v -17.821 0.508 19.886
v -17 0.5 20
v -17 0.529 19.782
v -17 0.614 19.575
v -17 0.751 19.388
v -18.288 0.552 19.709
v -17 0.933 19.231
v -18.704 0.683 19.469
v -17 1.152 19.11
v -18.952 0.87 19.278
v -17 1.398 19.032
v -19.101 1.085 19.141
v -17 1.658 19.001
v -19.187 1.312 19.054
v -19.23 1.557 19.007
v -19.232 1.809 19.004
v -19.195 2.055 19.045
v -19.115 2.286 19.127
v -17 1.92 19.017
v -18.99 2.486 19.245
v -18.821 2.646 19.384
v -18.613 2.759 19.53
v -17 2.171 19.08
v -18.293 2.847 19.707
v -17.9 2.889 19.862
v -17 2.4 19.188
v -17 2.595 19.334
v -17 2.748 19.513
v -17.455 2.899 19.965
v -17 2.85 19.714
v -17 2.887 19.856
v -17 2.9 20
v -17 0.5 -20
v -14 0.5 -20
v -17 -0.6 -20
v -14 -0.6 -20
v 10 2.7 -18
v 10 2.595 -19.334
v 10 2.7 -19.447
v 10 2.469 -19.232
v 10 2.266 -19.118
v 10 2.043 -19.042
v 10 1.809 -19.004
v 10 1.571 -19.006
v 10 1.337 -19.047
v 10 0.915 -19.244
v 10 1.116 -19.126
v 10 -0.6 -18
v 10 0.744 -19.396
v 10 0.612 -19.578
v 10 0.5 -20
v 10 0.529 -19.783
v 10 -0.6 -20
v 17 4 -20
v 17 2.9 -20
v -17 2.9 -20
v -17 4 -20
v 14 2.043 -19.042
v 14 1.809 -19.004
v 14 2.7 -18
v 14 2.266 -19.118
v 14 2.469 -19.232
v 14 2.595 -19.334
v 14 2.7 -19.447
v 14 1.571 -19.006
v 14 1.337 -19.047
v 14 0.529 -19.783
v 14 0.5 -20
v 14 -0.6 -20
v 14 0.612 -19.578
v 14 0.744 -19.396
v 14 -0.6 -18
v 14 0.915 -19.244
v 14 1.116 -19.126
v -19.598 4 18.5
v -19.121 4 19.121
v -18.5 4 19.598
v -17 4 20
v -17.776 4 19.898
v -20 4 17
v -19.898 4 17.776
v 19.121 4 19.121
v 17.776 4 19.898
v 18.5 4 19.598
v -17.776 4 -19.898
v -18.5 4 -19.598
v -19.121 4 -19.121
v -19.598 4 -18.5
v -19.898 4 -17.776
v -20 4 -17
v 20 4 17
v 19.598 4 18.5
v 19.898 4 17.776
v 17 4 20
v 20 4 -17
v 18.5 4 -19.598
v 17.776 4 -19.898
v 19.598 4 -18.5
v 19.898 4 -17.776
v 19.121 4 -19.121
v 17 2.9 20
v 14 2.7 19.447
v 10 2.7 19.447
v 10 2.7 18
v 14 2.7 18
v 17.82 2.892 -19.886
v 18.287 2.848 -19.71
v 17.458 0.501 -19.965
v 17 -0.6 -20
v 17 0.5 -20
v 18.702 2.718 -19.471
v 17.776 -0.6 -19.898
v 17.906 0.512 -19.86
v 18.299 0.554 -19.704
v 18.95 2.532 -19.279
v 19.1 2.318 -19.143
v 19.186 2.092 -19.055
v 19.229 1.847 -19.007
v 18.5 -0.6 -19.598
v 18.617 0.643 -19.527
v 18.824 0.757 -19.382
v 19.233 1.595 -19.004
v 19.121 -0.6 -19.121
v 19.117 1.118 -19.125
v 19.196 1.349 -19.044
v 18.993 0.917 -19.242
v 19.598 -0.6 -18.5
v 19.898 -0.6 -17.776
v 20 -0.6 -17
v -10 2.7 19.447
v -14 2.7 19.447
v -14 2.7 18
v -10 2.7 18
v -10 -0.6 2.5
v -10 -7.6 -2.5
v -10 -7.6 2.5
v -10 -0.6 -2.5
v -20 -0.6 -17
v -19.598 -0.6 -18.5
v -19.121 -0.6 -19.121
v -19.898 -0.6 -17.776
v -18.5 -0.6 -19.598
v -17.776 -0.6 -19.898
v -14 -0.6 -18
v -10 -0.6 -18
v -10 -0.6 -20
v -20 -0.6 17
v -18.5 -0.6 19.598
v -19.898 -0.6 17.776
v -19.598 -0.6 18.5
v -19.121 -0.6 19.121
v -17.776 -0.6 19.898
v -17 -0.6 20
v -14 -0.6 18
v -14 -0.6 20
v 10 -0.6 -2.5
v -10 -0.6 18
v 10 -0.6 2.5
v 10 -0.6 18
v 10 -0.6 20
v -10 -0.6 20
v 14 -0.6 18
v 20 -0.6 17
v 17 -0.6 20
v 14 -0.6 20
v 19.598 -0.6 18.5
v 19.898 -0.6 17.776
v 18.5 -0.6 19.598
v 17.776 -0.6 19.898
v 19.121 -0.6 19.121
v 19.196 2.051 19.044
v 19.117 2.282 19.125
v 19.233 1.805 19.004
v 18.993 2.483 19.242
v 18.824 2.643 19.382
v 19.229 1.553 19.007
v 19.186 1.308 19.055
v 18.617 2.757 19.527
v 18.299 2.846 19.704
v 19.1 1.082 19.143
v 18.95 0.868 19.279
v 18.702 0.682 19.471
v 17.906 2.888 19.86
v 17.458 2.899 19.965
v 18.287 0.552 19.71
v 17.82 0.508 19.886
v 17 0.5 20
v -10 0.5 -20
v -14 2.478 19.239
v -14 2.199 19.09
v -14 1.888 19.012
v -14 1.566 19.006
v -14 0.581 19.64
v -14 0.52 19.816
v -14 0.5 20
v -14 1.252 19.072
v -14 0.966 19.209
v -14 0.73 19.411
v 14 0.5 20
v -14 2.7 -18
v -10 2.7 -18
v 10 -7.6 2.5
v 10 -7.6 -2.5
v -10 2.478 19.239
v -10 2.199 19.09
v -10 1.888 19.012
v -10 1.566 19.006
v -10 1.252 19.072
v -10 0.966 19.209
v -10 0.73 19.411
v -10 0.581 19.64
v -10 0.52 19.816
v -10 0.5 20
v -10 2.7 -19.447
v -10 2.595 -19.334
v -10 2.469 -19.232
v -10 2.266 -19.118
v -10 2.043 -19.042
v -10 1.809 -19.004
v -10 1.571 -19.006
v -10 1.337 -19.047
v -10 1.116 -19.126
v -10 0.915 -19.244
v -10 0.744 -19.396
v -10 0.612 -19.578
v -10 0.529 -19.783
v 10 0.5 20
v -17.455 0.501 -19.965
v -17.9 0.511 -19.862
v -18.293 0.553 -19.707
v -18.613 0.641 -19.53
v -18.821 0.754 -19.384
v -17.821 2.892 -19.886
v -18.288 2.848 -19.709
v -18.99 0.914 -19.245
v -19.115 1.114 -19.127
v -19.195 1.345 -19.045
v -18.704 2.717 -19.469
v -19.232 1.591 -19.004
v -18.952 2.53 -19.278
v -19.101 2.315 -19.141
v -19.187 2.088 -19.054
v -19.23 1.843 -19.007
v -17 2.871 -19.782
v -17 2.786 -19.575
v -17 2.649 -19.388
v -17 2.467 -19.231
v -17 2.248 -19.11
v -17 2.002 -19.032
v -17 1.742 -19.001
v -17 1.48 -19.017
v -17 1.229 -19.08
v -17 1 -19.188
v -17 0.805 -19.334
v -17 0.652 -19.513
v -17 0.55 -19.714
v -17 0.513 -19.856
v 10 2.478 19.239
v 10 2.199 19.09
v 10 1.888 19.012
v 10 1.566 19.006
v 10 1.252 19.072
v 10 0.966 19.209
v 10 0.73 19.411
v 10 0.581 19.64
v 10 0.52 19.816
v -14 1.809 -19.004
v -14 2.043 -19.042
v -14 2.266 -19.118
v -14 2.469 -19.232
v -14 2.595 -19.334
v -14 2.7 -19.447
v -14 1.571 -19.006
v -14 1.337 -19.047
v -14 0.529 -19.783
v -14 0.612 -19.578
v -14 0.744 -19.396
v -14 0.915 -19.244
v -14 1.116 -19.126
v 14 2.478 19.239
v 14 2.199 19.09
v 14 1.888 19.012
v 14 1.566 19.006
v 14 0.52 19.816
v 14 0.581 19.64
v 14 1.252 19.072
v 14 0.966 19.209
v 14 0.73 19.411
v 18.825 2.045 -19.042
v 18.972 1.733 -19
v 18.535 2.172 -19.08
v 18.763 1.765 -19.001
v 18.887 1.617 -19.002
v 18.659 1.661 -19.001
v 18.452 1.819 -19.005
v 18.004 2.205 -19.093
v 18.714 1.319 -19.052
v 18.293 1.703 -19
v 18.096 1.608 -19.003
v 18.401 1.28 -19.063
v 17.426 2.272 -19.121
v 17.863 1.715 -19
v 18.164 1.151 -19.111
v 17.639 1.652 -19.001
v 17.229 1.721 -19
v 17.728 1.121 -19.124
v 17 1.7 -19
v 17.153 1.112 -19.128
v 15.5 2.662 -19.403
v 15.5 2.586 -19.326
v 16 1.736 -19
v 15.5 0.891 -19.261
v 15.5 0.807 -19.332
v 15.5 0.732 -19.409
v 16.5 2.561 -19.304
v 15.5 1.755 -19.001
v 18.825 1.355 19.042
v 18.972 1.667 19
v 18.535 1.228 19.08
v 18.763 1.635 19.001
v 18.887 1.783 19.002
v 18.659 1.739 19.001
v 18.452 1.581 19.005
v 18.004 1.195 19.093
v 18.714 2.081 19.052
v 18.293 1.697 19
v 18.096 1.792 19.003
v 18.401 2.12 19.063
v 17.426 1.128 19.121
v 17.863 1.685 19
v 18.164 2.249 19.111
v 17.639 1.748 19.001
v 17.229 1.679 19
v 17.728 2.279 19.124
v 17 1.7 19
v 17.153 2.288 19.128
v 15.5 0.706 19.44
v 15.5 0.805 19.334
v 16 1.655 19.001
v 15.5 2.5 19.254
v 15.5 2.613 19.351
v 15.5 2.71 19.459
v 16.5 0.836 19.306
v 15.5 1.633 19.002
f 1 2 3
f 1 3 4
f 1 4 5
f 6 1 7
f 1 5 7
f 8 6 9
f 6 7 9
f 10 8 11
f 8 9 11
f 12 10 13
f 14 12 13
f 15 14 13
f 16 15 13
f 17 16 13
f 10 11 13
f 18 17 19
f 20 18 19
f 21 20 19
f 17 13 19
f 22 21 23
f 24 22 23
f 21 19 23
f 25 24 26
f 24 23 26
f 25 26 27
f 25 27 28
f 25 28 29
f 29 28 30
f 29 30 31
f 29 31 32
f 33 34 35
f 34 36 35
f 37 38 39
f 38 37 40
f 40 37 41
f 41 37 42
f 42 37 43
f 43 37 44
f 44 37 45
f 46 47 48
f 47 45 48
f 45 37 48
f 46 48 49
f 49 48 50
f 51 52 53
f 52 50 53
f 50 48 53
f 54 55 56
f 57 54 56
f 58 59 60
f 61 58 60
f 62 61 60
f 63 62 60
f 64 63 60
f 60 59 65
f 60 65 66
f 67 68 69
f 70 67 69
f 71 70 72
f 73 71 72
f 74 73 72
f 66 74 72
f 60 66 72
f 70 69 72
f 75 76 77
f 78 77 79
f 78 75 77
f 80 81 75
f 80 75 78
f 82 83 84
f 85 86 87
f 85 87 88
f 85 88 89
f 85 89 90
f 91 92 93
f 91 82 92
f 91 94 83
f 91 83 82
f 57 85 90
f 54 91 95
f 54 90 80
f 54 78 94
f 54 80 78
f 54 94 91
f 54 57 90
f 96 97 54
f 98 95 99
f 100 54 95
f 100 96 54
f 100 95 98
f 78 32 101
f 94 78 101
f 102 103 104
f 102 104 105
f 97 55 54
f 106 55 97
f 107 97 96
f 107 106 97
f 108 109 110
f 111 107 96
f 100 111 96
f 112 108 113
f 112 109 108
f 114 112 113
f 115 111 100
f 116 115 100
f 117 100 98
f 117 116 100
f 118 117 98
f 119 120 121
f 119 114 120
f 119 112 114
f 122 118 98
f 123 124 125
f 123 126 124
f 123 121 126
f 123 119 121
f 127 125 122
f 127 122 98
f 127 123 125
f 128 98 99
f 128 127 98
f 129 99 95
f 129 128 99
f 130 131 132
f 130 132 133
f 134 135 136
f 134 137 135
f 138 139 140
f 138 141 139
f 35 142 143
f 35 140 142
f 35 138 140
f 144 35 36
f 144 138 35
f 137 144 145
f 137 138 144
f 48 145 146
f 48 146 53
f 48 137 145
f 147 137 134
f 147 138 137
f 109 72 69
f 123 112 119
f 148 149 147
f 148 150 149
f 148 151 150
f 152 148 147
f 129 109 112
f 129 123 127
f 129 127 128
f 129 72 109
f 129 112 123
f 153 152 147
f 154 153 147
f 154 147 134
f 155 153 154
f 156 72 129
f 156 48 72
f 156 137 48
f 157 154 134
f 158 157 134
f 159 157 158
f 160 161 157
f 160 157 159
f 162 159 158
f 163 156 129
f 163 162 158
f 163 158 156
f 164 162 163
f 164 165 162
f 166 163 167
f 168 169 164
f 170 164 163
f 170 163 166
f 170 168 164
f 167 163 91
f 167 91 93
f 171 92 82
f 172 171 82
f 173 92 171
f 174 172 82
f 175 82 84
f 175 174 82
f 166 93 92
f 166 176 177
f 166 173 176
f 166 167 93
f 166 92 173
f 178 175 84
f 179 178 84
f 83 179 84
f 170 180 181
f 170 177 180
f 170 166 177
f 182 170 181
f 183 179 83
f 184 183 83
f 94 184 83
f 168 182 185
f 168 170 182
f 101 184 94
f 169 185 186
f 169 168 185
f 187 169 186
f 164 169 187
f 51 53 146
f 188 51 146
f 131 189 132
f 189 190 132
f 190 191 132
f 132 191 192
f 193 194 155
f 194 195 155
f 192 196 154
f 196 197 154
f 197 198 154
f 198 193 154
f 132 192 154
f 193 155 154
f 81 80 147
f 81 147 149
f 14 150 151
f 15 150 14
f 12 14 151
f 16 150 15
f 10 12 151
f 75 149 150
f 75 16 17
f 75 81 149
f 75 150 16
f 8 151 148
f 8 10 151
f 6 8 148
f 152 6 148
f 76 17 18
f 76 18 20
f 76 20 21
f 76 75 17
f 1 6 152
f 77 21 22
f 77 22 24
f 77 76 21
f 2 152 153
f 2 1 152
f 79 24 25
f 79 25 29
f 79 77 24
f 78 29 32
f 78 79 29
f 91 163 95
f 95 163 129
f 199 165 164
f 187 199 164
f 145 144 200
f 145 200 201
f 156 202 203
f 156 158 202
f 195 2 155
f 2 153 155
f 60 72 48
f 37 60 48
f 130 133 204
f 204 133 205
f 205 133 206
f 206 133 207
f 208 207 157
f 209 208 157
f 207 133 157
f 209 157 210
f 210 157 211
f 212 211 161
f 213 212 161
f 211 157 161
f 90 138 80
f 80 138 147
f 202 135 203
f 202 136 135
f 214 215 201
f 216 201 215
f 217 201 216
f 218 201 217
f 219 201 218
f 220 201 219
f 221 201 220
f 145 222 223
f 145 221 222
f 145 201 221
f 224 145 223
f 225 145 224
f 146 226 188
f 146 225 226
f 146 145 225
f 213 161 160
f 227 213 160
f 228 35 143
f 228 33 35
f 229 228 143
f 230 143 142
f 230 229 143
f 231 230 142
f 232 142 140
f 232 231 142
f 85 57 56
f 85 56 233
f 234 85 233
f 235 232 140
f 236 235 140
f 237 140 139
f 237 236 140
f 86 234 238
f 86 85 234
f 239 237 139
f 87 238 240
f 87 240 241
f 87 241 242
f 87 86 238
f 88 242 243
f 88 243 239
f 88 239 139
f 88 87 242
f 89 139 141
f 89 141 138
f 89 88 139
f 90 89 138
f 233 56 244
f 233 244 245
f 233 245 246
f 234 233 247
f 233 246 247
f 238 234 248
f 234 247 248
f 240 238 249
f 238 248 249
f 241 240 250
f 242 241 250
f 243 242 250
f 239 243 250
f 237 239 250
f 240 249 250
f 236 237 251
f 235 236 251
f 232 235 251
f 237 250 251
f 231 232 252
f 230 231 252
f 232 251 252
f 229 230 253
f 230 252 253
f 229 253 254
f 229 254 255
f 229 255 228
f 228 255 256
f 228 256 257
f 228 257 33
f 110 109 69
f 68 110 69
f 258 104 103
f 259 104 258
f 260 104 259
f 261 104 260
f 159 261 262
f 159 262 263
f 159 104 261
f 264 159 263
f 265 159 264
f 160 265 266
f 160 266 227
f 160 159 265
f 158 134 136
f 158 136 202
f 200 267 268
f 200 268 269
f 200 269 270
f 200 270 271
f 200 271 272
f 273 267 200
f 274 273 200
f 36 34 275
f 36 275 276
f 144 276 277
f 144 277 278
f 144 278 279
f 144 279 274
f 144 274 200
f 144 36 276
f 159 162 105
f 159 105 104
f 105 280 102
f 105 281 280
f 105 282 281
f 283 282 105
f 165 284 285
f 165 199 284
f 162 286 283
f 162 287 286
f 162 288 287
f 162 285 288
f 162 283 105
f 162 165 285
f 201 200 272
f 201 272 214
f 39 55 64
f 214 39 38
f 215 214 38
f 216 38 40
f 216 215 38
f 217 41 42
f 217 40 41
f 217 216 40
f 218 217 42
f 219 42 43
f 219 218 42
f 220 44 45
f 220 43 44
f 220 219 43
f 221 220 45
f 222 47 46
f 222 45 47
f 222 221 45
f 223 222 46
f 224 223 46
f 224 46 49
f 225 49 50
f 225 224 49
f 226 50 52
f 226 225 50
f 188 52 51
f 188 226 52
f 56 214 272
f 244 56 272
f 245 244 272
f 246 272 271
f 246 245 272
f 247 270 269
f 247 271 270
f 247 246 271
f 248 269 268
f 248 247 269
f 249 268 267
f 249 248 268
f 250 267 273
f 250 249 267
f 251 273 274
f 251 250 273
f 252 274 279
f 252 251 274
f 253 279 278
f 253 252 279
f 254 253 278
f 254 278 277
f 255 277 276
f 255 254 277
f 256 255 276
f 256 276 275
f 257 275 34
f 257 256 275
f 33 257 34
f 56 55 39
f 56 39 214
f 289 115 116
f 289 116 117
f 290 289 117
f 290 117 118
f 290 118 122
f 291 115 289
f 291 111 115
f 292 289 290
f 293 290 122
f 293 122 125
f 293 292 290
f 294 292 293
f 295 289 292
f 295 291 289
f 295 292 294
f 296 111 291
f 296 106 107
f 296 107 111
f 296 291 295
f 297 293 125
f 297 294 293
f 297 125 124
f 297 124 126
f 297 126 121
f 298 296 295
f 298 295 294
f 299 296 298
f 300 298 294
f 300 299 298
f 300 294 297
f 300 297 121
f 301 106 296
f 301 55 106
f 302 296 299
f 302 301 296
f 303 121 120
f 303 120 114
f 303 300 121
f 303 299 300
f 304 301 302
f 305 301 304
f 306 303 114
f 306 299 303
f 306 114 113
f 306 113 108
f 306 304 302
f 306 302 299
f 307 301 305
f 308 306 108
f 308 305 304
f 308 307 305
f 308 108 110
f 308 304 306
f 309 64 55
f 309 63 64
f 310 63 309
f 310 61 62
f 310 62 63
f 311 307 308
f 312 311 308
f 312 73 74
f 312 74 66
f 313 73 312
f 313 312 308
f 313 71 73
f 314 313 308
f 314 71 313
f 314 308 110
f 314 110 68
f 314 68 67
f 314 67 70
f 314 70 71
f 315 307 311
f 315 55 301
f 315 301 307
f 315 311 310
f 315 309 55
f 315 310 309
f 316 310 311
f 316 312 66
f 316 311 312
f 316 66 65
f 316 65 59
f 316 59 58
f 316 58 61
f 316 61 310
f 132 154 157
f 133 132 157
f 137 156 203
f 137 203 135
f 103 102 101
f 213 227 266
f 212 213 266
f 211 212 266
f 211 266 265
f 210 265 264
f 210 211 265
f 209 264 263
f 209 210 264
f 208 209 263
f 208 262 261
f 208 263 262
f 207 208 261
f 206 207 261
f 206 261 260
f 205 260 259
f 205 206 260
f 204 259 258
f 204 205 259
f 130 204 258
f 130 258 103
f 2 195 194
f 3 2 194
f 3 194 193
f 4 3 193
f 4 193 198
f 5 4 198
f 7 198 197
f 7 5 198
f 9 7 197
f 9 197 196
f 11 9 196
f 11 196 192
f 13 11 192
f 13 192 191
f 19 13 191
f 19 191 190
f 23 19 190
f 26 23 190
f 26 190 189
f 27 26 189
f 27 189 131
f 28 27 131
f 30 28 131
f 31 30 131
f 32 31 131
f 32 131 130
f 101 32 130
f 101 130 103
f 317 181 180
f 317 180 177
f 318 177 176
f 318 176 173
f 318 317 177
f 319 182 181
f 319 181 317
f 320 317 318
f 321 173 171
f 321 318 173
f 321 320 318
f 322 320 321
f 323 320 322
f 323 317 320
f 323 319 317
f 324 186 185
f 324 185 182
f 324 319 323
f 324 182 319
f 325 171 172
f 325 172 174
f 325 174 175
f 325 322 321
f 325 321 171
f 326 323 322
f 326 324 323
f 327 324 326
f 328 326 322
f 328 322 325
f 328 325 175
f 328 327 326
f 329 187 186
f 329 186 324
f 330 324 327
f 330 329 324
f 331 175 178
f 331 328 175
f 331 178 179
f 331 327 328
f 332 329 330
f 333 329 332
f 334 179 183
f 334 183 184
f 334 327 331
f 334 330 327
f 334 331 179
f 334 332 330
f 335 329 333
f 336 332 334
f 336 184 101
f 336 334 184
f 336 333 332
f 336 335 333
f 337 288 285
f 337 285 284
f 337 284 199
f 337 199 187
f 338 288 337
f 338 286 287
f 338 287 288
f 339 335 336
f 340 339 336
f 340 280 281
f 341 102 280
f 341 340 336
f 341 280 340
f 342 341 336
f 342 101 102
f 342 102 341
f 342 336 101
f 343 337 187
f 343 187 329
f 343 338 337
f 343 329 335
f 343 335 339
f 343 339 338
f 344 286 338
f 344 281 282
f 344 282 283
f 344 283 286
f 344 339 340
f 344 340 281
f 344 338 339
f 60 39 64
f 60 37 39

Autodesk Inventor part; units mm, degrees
ref_plane "YZ Plane" through (0, 0, 0) normal (1, 0, 0) x (0, 1, 0)
ref_plane "XZ Plane" through (0, 0, 0) normal (0, 1, 0) x (-1, 0, 0)
sketch "Sketch1" plane through (0, 0, 0) normal (0, 1, 0) x (-1, 0, 0)
  line L0 (20, 20) -> (-20, 20)
  line L1 (-20, 20) -> (-20, -20)
  line L2 (-20, -20) -> (20, -20)
  line L3 (20, -20) -> (20, 20)
  circle A0 centre (12.5, 12.5) radius 4.25
  circle A1 centre (12.5, -12.5) radius 4.25
  circle A2 centre (-12.5, -12.5) radius 4.25
  circle A3 centre (-12.5, 12.5) radius 4.25
  line L4 (20, 0) -> (-20, 0) construction
  line L5 (0, 20) -> (0, -20) construction
  point P0 (0, 0)
  dimension "d0" = 40
  dimension "d1" = 40
  dimension "d2" = 8.5
  dimension "d3" = 25
  dimension "d4" = 25
extrude "Extrusion2" add sketch "Sketch1" along normal blind 2 contours L3 L2 L1 L0 | A0 | A1 | A2 | A3
sketch "Sketch2" plane through (0, 0, 0) normal (0, -1, 0) x (1, 0, 0)
  line L0 (20, 20) -> (20, -20) projected
  line L1 (-20, 20) -> (20, 20) projected
  line L2 (-20, -20) -> (-20, 20) projected
  line L3 (20, -20) -> (-20, -20) projected
  point P0 (0, 0)
extrude "Extrusion3" add sketch "Sketch2" along normal blind 0.6
sketch "Sketch3" plane through (0, 2, 0) normal (0, 1, 0) x (1, 0, 0)
  line L0 (-20, 20) -> (-20, -20) projected
  line L1 (-20, -20) -> (20, -20) projected
  line L2 (20, -20) -> (20, 20) projected
  line L3 (20, 20) -> (-20, 20) projected
  point P0 (0, 0)
extrude "Extrusion4" add sketch "Sketch3" along normal blind 2
fillet "Fillet1" radius 3 4 edges at (-20, 1.7, 20) (-20, 1.7, -20) (20, 1.7, 20) (20, 1.7, -20)
ref_plane "Arbeitsebene1" through (-17, 4, 20) normal (1, 0, 0) x (0, -1, 0)
sketch "Skizze5" plane through (-17, 4, 20) normal (1, 0, 0) x (0, -1, 0)
  line L0 (0, 0) -> (4.6, 0) construction
  line L1 (0, 0) -> (0, 3) construction
  line L2 (0.7, 0) -> (3.5, 0) construction
  line L3 (6.1491, 20) -> (-1.642, 20) construction
  line L4 (0, 40) -> (4.6, 40) construction
  line L5 (0.7, 40) -> (3.5, 40) construction
  line L6 (2.3, 0) -> (2.3, 4.6722) construction
  ellipse E0 centre (2.3, 0) end of major axis (3.5, 0) minor radius 1
  line L7 (1.1, 0) -> (3.5, 0)
  line L8 (0, 40) -> (4.6, 40) construction
  line L9 (0.7, 40) -> (3.5, 40) construction
  ellipse E1 centre (2.3, 40) end of major axis (3.5, 40) minor radius 1
  line L10 (1.1, 40) -> (3.5, 40)
  point P0 (4, 20)
  point P1 (2.3, 1)
  dimension "d22" = 2.3
  dimension "d23" = 1.2
  dimension "d28" = 1
extrude "Extrusion7" cut sketch "Skizze5" along normal blind 37 and the other way blind 5 contours L7 E0 | E1 L10 picked at (2.3176, 0.333) picked at (2.2824, 39.667)
sketch "Skizze6" plane through (0, -0.6, 0) normal (0, -1, 0) x (1, 0, 0)
  line L0 (17, 20) -> (-17, 20) projected
  line L1 (-20, 17) -> (-20, -17) construction
  line L2 (-14, 20) -> (-14, 18)
  line L3 (-14, 20) -> (-10, 20)
  line L4 (0, 16.6905) -> (0, 25.5183)
  line L5 (7.2129, 0) -> (-7.9382, 0)
  line L6 (-17, 20) -> (17, 20)
  line L7 (14, 20) -> (10, 20)
  line L8 (17, -20) -> (-17, -20)
  line L9 (-14, 18) -> (-10, 18)
  line L10 (-10, 18) -> (-10, 20)
  line L11 (-17, -20) -> (17, -20) projected
  line L12 (14, 20) -> (14, 18)
  line L13 (14, 18) -> (10, 18)
  line L14 (10, 18) -> (10, 20)
  line L15 (-14, -20) -> (-14, -18)
  line L16 (-14, -18) -> (-10, -18)
  line L17 (-10, -18) -> (-10, -20)
  line L18 (10, -18) -> (10, -20)
  line L19 (14, -18) -> (10, -18)
  line L20 (14, -20) -> (14, -18)
  point P0 (0, 0)
  point P1 (-12, 20)
  dimension "d34" = 8
  dimension "d35" = 2
  dimension "d41" = 2
  dimension "d42" = 4
extrude "Extrusion8" cut sketch "Skizze6" against normal blind 3.3
sketch "Skizze7" plane through (0, -0.6, 0) normal (0, -1, 0) x (1, 0, 0)
  line L0 (-10, 2.5) -> (10, 2.5)
  line L1 (10, 2.5) -> (10, -2.5)
  line L2 (10, -2.5) -> (-10, -2.5)
  line L3 (-10, -2.5) -> (-10, 2.5)
  line L4 (-10, 2.5) -> (10, -2.5) construction
  line L5 (10, 2.5) -> (-10, -2.5) construction
  point P0 (0, 0)
  dimension "d43" = 5
  dimension "d44" = 20
extrude "Extrusion9" add sketch "Skizze7" along normal blind 7
properties part number "IMU_mount_baseplate"
